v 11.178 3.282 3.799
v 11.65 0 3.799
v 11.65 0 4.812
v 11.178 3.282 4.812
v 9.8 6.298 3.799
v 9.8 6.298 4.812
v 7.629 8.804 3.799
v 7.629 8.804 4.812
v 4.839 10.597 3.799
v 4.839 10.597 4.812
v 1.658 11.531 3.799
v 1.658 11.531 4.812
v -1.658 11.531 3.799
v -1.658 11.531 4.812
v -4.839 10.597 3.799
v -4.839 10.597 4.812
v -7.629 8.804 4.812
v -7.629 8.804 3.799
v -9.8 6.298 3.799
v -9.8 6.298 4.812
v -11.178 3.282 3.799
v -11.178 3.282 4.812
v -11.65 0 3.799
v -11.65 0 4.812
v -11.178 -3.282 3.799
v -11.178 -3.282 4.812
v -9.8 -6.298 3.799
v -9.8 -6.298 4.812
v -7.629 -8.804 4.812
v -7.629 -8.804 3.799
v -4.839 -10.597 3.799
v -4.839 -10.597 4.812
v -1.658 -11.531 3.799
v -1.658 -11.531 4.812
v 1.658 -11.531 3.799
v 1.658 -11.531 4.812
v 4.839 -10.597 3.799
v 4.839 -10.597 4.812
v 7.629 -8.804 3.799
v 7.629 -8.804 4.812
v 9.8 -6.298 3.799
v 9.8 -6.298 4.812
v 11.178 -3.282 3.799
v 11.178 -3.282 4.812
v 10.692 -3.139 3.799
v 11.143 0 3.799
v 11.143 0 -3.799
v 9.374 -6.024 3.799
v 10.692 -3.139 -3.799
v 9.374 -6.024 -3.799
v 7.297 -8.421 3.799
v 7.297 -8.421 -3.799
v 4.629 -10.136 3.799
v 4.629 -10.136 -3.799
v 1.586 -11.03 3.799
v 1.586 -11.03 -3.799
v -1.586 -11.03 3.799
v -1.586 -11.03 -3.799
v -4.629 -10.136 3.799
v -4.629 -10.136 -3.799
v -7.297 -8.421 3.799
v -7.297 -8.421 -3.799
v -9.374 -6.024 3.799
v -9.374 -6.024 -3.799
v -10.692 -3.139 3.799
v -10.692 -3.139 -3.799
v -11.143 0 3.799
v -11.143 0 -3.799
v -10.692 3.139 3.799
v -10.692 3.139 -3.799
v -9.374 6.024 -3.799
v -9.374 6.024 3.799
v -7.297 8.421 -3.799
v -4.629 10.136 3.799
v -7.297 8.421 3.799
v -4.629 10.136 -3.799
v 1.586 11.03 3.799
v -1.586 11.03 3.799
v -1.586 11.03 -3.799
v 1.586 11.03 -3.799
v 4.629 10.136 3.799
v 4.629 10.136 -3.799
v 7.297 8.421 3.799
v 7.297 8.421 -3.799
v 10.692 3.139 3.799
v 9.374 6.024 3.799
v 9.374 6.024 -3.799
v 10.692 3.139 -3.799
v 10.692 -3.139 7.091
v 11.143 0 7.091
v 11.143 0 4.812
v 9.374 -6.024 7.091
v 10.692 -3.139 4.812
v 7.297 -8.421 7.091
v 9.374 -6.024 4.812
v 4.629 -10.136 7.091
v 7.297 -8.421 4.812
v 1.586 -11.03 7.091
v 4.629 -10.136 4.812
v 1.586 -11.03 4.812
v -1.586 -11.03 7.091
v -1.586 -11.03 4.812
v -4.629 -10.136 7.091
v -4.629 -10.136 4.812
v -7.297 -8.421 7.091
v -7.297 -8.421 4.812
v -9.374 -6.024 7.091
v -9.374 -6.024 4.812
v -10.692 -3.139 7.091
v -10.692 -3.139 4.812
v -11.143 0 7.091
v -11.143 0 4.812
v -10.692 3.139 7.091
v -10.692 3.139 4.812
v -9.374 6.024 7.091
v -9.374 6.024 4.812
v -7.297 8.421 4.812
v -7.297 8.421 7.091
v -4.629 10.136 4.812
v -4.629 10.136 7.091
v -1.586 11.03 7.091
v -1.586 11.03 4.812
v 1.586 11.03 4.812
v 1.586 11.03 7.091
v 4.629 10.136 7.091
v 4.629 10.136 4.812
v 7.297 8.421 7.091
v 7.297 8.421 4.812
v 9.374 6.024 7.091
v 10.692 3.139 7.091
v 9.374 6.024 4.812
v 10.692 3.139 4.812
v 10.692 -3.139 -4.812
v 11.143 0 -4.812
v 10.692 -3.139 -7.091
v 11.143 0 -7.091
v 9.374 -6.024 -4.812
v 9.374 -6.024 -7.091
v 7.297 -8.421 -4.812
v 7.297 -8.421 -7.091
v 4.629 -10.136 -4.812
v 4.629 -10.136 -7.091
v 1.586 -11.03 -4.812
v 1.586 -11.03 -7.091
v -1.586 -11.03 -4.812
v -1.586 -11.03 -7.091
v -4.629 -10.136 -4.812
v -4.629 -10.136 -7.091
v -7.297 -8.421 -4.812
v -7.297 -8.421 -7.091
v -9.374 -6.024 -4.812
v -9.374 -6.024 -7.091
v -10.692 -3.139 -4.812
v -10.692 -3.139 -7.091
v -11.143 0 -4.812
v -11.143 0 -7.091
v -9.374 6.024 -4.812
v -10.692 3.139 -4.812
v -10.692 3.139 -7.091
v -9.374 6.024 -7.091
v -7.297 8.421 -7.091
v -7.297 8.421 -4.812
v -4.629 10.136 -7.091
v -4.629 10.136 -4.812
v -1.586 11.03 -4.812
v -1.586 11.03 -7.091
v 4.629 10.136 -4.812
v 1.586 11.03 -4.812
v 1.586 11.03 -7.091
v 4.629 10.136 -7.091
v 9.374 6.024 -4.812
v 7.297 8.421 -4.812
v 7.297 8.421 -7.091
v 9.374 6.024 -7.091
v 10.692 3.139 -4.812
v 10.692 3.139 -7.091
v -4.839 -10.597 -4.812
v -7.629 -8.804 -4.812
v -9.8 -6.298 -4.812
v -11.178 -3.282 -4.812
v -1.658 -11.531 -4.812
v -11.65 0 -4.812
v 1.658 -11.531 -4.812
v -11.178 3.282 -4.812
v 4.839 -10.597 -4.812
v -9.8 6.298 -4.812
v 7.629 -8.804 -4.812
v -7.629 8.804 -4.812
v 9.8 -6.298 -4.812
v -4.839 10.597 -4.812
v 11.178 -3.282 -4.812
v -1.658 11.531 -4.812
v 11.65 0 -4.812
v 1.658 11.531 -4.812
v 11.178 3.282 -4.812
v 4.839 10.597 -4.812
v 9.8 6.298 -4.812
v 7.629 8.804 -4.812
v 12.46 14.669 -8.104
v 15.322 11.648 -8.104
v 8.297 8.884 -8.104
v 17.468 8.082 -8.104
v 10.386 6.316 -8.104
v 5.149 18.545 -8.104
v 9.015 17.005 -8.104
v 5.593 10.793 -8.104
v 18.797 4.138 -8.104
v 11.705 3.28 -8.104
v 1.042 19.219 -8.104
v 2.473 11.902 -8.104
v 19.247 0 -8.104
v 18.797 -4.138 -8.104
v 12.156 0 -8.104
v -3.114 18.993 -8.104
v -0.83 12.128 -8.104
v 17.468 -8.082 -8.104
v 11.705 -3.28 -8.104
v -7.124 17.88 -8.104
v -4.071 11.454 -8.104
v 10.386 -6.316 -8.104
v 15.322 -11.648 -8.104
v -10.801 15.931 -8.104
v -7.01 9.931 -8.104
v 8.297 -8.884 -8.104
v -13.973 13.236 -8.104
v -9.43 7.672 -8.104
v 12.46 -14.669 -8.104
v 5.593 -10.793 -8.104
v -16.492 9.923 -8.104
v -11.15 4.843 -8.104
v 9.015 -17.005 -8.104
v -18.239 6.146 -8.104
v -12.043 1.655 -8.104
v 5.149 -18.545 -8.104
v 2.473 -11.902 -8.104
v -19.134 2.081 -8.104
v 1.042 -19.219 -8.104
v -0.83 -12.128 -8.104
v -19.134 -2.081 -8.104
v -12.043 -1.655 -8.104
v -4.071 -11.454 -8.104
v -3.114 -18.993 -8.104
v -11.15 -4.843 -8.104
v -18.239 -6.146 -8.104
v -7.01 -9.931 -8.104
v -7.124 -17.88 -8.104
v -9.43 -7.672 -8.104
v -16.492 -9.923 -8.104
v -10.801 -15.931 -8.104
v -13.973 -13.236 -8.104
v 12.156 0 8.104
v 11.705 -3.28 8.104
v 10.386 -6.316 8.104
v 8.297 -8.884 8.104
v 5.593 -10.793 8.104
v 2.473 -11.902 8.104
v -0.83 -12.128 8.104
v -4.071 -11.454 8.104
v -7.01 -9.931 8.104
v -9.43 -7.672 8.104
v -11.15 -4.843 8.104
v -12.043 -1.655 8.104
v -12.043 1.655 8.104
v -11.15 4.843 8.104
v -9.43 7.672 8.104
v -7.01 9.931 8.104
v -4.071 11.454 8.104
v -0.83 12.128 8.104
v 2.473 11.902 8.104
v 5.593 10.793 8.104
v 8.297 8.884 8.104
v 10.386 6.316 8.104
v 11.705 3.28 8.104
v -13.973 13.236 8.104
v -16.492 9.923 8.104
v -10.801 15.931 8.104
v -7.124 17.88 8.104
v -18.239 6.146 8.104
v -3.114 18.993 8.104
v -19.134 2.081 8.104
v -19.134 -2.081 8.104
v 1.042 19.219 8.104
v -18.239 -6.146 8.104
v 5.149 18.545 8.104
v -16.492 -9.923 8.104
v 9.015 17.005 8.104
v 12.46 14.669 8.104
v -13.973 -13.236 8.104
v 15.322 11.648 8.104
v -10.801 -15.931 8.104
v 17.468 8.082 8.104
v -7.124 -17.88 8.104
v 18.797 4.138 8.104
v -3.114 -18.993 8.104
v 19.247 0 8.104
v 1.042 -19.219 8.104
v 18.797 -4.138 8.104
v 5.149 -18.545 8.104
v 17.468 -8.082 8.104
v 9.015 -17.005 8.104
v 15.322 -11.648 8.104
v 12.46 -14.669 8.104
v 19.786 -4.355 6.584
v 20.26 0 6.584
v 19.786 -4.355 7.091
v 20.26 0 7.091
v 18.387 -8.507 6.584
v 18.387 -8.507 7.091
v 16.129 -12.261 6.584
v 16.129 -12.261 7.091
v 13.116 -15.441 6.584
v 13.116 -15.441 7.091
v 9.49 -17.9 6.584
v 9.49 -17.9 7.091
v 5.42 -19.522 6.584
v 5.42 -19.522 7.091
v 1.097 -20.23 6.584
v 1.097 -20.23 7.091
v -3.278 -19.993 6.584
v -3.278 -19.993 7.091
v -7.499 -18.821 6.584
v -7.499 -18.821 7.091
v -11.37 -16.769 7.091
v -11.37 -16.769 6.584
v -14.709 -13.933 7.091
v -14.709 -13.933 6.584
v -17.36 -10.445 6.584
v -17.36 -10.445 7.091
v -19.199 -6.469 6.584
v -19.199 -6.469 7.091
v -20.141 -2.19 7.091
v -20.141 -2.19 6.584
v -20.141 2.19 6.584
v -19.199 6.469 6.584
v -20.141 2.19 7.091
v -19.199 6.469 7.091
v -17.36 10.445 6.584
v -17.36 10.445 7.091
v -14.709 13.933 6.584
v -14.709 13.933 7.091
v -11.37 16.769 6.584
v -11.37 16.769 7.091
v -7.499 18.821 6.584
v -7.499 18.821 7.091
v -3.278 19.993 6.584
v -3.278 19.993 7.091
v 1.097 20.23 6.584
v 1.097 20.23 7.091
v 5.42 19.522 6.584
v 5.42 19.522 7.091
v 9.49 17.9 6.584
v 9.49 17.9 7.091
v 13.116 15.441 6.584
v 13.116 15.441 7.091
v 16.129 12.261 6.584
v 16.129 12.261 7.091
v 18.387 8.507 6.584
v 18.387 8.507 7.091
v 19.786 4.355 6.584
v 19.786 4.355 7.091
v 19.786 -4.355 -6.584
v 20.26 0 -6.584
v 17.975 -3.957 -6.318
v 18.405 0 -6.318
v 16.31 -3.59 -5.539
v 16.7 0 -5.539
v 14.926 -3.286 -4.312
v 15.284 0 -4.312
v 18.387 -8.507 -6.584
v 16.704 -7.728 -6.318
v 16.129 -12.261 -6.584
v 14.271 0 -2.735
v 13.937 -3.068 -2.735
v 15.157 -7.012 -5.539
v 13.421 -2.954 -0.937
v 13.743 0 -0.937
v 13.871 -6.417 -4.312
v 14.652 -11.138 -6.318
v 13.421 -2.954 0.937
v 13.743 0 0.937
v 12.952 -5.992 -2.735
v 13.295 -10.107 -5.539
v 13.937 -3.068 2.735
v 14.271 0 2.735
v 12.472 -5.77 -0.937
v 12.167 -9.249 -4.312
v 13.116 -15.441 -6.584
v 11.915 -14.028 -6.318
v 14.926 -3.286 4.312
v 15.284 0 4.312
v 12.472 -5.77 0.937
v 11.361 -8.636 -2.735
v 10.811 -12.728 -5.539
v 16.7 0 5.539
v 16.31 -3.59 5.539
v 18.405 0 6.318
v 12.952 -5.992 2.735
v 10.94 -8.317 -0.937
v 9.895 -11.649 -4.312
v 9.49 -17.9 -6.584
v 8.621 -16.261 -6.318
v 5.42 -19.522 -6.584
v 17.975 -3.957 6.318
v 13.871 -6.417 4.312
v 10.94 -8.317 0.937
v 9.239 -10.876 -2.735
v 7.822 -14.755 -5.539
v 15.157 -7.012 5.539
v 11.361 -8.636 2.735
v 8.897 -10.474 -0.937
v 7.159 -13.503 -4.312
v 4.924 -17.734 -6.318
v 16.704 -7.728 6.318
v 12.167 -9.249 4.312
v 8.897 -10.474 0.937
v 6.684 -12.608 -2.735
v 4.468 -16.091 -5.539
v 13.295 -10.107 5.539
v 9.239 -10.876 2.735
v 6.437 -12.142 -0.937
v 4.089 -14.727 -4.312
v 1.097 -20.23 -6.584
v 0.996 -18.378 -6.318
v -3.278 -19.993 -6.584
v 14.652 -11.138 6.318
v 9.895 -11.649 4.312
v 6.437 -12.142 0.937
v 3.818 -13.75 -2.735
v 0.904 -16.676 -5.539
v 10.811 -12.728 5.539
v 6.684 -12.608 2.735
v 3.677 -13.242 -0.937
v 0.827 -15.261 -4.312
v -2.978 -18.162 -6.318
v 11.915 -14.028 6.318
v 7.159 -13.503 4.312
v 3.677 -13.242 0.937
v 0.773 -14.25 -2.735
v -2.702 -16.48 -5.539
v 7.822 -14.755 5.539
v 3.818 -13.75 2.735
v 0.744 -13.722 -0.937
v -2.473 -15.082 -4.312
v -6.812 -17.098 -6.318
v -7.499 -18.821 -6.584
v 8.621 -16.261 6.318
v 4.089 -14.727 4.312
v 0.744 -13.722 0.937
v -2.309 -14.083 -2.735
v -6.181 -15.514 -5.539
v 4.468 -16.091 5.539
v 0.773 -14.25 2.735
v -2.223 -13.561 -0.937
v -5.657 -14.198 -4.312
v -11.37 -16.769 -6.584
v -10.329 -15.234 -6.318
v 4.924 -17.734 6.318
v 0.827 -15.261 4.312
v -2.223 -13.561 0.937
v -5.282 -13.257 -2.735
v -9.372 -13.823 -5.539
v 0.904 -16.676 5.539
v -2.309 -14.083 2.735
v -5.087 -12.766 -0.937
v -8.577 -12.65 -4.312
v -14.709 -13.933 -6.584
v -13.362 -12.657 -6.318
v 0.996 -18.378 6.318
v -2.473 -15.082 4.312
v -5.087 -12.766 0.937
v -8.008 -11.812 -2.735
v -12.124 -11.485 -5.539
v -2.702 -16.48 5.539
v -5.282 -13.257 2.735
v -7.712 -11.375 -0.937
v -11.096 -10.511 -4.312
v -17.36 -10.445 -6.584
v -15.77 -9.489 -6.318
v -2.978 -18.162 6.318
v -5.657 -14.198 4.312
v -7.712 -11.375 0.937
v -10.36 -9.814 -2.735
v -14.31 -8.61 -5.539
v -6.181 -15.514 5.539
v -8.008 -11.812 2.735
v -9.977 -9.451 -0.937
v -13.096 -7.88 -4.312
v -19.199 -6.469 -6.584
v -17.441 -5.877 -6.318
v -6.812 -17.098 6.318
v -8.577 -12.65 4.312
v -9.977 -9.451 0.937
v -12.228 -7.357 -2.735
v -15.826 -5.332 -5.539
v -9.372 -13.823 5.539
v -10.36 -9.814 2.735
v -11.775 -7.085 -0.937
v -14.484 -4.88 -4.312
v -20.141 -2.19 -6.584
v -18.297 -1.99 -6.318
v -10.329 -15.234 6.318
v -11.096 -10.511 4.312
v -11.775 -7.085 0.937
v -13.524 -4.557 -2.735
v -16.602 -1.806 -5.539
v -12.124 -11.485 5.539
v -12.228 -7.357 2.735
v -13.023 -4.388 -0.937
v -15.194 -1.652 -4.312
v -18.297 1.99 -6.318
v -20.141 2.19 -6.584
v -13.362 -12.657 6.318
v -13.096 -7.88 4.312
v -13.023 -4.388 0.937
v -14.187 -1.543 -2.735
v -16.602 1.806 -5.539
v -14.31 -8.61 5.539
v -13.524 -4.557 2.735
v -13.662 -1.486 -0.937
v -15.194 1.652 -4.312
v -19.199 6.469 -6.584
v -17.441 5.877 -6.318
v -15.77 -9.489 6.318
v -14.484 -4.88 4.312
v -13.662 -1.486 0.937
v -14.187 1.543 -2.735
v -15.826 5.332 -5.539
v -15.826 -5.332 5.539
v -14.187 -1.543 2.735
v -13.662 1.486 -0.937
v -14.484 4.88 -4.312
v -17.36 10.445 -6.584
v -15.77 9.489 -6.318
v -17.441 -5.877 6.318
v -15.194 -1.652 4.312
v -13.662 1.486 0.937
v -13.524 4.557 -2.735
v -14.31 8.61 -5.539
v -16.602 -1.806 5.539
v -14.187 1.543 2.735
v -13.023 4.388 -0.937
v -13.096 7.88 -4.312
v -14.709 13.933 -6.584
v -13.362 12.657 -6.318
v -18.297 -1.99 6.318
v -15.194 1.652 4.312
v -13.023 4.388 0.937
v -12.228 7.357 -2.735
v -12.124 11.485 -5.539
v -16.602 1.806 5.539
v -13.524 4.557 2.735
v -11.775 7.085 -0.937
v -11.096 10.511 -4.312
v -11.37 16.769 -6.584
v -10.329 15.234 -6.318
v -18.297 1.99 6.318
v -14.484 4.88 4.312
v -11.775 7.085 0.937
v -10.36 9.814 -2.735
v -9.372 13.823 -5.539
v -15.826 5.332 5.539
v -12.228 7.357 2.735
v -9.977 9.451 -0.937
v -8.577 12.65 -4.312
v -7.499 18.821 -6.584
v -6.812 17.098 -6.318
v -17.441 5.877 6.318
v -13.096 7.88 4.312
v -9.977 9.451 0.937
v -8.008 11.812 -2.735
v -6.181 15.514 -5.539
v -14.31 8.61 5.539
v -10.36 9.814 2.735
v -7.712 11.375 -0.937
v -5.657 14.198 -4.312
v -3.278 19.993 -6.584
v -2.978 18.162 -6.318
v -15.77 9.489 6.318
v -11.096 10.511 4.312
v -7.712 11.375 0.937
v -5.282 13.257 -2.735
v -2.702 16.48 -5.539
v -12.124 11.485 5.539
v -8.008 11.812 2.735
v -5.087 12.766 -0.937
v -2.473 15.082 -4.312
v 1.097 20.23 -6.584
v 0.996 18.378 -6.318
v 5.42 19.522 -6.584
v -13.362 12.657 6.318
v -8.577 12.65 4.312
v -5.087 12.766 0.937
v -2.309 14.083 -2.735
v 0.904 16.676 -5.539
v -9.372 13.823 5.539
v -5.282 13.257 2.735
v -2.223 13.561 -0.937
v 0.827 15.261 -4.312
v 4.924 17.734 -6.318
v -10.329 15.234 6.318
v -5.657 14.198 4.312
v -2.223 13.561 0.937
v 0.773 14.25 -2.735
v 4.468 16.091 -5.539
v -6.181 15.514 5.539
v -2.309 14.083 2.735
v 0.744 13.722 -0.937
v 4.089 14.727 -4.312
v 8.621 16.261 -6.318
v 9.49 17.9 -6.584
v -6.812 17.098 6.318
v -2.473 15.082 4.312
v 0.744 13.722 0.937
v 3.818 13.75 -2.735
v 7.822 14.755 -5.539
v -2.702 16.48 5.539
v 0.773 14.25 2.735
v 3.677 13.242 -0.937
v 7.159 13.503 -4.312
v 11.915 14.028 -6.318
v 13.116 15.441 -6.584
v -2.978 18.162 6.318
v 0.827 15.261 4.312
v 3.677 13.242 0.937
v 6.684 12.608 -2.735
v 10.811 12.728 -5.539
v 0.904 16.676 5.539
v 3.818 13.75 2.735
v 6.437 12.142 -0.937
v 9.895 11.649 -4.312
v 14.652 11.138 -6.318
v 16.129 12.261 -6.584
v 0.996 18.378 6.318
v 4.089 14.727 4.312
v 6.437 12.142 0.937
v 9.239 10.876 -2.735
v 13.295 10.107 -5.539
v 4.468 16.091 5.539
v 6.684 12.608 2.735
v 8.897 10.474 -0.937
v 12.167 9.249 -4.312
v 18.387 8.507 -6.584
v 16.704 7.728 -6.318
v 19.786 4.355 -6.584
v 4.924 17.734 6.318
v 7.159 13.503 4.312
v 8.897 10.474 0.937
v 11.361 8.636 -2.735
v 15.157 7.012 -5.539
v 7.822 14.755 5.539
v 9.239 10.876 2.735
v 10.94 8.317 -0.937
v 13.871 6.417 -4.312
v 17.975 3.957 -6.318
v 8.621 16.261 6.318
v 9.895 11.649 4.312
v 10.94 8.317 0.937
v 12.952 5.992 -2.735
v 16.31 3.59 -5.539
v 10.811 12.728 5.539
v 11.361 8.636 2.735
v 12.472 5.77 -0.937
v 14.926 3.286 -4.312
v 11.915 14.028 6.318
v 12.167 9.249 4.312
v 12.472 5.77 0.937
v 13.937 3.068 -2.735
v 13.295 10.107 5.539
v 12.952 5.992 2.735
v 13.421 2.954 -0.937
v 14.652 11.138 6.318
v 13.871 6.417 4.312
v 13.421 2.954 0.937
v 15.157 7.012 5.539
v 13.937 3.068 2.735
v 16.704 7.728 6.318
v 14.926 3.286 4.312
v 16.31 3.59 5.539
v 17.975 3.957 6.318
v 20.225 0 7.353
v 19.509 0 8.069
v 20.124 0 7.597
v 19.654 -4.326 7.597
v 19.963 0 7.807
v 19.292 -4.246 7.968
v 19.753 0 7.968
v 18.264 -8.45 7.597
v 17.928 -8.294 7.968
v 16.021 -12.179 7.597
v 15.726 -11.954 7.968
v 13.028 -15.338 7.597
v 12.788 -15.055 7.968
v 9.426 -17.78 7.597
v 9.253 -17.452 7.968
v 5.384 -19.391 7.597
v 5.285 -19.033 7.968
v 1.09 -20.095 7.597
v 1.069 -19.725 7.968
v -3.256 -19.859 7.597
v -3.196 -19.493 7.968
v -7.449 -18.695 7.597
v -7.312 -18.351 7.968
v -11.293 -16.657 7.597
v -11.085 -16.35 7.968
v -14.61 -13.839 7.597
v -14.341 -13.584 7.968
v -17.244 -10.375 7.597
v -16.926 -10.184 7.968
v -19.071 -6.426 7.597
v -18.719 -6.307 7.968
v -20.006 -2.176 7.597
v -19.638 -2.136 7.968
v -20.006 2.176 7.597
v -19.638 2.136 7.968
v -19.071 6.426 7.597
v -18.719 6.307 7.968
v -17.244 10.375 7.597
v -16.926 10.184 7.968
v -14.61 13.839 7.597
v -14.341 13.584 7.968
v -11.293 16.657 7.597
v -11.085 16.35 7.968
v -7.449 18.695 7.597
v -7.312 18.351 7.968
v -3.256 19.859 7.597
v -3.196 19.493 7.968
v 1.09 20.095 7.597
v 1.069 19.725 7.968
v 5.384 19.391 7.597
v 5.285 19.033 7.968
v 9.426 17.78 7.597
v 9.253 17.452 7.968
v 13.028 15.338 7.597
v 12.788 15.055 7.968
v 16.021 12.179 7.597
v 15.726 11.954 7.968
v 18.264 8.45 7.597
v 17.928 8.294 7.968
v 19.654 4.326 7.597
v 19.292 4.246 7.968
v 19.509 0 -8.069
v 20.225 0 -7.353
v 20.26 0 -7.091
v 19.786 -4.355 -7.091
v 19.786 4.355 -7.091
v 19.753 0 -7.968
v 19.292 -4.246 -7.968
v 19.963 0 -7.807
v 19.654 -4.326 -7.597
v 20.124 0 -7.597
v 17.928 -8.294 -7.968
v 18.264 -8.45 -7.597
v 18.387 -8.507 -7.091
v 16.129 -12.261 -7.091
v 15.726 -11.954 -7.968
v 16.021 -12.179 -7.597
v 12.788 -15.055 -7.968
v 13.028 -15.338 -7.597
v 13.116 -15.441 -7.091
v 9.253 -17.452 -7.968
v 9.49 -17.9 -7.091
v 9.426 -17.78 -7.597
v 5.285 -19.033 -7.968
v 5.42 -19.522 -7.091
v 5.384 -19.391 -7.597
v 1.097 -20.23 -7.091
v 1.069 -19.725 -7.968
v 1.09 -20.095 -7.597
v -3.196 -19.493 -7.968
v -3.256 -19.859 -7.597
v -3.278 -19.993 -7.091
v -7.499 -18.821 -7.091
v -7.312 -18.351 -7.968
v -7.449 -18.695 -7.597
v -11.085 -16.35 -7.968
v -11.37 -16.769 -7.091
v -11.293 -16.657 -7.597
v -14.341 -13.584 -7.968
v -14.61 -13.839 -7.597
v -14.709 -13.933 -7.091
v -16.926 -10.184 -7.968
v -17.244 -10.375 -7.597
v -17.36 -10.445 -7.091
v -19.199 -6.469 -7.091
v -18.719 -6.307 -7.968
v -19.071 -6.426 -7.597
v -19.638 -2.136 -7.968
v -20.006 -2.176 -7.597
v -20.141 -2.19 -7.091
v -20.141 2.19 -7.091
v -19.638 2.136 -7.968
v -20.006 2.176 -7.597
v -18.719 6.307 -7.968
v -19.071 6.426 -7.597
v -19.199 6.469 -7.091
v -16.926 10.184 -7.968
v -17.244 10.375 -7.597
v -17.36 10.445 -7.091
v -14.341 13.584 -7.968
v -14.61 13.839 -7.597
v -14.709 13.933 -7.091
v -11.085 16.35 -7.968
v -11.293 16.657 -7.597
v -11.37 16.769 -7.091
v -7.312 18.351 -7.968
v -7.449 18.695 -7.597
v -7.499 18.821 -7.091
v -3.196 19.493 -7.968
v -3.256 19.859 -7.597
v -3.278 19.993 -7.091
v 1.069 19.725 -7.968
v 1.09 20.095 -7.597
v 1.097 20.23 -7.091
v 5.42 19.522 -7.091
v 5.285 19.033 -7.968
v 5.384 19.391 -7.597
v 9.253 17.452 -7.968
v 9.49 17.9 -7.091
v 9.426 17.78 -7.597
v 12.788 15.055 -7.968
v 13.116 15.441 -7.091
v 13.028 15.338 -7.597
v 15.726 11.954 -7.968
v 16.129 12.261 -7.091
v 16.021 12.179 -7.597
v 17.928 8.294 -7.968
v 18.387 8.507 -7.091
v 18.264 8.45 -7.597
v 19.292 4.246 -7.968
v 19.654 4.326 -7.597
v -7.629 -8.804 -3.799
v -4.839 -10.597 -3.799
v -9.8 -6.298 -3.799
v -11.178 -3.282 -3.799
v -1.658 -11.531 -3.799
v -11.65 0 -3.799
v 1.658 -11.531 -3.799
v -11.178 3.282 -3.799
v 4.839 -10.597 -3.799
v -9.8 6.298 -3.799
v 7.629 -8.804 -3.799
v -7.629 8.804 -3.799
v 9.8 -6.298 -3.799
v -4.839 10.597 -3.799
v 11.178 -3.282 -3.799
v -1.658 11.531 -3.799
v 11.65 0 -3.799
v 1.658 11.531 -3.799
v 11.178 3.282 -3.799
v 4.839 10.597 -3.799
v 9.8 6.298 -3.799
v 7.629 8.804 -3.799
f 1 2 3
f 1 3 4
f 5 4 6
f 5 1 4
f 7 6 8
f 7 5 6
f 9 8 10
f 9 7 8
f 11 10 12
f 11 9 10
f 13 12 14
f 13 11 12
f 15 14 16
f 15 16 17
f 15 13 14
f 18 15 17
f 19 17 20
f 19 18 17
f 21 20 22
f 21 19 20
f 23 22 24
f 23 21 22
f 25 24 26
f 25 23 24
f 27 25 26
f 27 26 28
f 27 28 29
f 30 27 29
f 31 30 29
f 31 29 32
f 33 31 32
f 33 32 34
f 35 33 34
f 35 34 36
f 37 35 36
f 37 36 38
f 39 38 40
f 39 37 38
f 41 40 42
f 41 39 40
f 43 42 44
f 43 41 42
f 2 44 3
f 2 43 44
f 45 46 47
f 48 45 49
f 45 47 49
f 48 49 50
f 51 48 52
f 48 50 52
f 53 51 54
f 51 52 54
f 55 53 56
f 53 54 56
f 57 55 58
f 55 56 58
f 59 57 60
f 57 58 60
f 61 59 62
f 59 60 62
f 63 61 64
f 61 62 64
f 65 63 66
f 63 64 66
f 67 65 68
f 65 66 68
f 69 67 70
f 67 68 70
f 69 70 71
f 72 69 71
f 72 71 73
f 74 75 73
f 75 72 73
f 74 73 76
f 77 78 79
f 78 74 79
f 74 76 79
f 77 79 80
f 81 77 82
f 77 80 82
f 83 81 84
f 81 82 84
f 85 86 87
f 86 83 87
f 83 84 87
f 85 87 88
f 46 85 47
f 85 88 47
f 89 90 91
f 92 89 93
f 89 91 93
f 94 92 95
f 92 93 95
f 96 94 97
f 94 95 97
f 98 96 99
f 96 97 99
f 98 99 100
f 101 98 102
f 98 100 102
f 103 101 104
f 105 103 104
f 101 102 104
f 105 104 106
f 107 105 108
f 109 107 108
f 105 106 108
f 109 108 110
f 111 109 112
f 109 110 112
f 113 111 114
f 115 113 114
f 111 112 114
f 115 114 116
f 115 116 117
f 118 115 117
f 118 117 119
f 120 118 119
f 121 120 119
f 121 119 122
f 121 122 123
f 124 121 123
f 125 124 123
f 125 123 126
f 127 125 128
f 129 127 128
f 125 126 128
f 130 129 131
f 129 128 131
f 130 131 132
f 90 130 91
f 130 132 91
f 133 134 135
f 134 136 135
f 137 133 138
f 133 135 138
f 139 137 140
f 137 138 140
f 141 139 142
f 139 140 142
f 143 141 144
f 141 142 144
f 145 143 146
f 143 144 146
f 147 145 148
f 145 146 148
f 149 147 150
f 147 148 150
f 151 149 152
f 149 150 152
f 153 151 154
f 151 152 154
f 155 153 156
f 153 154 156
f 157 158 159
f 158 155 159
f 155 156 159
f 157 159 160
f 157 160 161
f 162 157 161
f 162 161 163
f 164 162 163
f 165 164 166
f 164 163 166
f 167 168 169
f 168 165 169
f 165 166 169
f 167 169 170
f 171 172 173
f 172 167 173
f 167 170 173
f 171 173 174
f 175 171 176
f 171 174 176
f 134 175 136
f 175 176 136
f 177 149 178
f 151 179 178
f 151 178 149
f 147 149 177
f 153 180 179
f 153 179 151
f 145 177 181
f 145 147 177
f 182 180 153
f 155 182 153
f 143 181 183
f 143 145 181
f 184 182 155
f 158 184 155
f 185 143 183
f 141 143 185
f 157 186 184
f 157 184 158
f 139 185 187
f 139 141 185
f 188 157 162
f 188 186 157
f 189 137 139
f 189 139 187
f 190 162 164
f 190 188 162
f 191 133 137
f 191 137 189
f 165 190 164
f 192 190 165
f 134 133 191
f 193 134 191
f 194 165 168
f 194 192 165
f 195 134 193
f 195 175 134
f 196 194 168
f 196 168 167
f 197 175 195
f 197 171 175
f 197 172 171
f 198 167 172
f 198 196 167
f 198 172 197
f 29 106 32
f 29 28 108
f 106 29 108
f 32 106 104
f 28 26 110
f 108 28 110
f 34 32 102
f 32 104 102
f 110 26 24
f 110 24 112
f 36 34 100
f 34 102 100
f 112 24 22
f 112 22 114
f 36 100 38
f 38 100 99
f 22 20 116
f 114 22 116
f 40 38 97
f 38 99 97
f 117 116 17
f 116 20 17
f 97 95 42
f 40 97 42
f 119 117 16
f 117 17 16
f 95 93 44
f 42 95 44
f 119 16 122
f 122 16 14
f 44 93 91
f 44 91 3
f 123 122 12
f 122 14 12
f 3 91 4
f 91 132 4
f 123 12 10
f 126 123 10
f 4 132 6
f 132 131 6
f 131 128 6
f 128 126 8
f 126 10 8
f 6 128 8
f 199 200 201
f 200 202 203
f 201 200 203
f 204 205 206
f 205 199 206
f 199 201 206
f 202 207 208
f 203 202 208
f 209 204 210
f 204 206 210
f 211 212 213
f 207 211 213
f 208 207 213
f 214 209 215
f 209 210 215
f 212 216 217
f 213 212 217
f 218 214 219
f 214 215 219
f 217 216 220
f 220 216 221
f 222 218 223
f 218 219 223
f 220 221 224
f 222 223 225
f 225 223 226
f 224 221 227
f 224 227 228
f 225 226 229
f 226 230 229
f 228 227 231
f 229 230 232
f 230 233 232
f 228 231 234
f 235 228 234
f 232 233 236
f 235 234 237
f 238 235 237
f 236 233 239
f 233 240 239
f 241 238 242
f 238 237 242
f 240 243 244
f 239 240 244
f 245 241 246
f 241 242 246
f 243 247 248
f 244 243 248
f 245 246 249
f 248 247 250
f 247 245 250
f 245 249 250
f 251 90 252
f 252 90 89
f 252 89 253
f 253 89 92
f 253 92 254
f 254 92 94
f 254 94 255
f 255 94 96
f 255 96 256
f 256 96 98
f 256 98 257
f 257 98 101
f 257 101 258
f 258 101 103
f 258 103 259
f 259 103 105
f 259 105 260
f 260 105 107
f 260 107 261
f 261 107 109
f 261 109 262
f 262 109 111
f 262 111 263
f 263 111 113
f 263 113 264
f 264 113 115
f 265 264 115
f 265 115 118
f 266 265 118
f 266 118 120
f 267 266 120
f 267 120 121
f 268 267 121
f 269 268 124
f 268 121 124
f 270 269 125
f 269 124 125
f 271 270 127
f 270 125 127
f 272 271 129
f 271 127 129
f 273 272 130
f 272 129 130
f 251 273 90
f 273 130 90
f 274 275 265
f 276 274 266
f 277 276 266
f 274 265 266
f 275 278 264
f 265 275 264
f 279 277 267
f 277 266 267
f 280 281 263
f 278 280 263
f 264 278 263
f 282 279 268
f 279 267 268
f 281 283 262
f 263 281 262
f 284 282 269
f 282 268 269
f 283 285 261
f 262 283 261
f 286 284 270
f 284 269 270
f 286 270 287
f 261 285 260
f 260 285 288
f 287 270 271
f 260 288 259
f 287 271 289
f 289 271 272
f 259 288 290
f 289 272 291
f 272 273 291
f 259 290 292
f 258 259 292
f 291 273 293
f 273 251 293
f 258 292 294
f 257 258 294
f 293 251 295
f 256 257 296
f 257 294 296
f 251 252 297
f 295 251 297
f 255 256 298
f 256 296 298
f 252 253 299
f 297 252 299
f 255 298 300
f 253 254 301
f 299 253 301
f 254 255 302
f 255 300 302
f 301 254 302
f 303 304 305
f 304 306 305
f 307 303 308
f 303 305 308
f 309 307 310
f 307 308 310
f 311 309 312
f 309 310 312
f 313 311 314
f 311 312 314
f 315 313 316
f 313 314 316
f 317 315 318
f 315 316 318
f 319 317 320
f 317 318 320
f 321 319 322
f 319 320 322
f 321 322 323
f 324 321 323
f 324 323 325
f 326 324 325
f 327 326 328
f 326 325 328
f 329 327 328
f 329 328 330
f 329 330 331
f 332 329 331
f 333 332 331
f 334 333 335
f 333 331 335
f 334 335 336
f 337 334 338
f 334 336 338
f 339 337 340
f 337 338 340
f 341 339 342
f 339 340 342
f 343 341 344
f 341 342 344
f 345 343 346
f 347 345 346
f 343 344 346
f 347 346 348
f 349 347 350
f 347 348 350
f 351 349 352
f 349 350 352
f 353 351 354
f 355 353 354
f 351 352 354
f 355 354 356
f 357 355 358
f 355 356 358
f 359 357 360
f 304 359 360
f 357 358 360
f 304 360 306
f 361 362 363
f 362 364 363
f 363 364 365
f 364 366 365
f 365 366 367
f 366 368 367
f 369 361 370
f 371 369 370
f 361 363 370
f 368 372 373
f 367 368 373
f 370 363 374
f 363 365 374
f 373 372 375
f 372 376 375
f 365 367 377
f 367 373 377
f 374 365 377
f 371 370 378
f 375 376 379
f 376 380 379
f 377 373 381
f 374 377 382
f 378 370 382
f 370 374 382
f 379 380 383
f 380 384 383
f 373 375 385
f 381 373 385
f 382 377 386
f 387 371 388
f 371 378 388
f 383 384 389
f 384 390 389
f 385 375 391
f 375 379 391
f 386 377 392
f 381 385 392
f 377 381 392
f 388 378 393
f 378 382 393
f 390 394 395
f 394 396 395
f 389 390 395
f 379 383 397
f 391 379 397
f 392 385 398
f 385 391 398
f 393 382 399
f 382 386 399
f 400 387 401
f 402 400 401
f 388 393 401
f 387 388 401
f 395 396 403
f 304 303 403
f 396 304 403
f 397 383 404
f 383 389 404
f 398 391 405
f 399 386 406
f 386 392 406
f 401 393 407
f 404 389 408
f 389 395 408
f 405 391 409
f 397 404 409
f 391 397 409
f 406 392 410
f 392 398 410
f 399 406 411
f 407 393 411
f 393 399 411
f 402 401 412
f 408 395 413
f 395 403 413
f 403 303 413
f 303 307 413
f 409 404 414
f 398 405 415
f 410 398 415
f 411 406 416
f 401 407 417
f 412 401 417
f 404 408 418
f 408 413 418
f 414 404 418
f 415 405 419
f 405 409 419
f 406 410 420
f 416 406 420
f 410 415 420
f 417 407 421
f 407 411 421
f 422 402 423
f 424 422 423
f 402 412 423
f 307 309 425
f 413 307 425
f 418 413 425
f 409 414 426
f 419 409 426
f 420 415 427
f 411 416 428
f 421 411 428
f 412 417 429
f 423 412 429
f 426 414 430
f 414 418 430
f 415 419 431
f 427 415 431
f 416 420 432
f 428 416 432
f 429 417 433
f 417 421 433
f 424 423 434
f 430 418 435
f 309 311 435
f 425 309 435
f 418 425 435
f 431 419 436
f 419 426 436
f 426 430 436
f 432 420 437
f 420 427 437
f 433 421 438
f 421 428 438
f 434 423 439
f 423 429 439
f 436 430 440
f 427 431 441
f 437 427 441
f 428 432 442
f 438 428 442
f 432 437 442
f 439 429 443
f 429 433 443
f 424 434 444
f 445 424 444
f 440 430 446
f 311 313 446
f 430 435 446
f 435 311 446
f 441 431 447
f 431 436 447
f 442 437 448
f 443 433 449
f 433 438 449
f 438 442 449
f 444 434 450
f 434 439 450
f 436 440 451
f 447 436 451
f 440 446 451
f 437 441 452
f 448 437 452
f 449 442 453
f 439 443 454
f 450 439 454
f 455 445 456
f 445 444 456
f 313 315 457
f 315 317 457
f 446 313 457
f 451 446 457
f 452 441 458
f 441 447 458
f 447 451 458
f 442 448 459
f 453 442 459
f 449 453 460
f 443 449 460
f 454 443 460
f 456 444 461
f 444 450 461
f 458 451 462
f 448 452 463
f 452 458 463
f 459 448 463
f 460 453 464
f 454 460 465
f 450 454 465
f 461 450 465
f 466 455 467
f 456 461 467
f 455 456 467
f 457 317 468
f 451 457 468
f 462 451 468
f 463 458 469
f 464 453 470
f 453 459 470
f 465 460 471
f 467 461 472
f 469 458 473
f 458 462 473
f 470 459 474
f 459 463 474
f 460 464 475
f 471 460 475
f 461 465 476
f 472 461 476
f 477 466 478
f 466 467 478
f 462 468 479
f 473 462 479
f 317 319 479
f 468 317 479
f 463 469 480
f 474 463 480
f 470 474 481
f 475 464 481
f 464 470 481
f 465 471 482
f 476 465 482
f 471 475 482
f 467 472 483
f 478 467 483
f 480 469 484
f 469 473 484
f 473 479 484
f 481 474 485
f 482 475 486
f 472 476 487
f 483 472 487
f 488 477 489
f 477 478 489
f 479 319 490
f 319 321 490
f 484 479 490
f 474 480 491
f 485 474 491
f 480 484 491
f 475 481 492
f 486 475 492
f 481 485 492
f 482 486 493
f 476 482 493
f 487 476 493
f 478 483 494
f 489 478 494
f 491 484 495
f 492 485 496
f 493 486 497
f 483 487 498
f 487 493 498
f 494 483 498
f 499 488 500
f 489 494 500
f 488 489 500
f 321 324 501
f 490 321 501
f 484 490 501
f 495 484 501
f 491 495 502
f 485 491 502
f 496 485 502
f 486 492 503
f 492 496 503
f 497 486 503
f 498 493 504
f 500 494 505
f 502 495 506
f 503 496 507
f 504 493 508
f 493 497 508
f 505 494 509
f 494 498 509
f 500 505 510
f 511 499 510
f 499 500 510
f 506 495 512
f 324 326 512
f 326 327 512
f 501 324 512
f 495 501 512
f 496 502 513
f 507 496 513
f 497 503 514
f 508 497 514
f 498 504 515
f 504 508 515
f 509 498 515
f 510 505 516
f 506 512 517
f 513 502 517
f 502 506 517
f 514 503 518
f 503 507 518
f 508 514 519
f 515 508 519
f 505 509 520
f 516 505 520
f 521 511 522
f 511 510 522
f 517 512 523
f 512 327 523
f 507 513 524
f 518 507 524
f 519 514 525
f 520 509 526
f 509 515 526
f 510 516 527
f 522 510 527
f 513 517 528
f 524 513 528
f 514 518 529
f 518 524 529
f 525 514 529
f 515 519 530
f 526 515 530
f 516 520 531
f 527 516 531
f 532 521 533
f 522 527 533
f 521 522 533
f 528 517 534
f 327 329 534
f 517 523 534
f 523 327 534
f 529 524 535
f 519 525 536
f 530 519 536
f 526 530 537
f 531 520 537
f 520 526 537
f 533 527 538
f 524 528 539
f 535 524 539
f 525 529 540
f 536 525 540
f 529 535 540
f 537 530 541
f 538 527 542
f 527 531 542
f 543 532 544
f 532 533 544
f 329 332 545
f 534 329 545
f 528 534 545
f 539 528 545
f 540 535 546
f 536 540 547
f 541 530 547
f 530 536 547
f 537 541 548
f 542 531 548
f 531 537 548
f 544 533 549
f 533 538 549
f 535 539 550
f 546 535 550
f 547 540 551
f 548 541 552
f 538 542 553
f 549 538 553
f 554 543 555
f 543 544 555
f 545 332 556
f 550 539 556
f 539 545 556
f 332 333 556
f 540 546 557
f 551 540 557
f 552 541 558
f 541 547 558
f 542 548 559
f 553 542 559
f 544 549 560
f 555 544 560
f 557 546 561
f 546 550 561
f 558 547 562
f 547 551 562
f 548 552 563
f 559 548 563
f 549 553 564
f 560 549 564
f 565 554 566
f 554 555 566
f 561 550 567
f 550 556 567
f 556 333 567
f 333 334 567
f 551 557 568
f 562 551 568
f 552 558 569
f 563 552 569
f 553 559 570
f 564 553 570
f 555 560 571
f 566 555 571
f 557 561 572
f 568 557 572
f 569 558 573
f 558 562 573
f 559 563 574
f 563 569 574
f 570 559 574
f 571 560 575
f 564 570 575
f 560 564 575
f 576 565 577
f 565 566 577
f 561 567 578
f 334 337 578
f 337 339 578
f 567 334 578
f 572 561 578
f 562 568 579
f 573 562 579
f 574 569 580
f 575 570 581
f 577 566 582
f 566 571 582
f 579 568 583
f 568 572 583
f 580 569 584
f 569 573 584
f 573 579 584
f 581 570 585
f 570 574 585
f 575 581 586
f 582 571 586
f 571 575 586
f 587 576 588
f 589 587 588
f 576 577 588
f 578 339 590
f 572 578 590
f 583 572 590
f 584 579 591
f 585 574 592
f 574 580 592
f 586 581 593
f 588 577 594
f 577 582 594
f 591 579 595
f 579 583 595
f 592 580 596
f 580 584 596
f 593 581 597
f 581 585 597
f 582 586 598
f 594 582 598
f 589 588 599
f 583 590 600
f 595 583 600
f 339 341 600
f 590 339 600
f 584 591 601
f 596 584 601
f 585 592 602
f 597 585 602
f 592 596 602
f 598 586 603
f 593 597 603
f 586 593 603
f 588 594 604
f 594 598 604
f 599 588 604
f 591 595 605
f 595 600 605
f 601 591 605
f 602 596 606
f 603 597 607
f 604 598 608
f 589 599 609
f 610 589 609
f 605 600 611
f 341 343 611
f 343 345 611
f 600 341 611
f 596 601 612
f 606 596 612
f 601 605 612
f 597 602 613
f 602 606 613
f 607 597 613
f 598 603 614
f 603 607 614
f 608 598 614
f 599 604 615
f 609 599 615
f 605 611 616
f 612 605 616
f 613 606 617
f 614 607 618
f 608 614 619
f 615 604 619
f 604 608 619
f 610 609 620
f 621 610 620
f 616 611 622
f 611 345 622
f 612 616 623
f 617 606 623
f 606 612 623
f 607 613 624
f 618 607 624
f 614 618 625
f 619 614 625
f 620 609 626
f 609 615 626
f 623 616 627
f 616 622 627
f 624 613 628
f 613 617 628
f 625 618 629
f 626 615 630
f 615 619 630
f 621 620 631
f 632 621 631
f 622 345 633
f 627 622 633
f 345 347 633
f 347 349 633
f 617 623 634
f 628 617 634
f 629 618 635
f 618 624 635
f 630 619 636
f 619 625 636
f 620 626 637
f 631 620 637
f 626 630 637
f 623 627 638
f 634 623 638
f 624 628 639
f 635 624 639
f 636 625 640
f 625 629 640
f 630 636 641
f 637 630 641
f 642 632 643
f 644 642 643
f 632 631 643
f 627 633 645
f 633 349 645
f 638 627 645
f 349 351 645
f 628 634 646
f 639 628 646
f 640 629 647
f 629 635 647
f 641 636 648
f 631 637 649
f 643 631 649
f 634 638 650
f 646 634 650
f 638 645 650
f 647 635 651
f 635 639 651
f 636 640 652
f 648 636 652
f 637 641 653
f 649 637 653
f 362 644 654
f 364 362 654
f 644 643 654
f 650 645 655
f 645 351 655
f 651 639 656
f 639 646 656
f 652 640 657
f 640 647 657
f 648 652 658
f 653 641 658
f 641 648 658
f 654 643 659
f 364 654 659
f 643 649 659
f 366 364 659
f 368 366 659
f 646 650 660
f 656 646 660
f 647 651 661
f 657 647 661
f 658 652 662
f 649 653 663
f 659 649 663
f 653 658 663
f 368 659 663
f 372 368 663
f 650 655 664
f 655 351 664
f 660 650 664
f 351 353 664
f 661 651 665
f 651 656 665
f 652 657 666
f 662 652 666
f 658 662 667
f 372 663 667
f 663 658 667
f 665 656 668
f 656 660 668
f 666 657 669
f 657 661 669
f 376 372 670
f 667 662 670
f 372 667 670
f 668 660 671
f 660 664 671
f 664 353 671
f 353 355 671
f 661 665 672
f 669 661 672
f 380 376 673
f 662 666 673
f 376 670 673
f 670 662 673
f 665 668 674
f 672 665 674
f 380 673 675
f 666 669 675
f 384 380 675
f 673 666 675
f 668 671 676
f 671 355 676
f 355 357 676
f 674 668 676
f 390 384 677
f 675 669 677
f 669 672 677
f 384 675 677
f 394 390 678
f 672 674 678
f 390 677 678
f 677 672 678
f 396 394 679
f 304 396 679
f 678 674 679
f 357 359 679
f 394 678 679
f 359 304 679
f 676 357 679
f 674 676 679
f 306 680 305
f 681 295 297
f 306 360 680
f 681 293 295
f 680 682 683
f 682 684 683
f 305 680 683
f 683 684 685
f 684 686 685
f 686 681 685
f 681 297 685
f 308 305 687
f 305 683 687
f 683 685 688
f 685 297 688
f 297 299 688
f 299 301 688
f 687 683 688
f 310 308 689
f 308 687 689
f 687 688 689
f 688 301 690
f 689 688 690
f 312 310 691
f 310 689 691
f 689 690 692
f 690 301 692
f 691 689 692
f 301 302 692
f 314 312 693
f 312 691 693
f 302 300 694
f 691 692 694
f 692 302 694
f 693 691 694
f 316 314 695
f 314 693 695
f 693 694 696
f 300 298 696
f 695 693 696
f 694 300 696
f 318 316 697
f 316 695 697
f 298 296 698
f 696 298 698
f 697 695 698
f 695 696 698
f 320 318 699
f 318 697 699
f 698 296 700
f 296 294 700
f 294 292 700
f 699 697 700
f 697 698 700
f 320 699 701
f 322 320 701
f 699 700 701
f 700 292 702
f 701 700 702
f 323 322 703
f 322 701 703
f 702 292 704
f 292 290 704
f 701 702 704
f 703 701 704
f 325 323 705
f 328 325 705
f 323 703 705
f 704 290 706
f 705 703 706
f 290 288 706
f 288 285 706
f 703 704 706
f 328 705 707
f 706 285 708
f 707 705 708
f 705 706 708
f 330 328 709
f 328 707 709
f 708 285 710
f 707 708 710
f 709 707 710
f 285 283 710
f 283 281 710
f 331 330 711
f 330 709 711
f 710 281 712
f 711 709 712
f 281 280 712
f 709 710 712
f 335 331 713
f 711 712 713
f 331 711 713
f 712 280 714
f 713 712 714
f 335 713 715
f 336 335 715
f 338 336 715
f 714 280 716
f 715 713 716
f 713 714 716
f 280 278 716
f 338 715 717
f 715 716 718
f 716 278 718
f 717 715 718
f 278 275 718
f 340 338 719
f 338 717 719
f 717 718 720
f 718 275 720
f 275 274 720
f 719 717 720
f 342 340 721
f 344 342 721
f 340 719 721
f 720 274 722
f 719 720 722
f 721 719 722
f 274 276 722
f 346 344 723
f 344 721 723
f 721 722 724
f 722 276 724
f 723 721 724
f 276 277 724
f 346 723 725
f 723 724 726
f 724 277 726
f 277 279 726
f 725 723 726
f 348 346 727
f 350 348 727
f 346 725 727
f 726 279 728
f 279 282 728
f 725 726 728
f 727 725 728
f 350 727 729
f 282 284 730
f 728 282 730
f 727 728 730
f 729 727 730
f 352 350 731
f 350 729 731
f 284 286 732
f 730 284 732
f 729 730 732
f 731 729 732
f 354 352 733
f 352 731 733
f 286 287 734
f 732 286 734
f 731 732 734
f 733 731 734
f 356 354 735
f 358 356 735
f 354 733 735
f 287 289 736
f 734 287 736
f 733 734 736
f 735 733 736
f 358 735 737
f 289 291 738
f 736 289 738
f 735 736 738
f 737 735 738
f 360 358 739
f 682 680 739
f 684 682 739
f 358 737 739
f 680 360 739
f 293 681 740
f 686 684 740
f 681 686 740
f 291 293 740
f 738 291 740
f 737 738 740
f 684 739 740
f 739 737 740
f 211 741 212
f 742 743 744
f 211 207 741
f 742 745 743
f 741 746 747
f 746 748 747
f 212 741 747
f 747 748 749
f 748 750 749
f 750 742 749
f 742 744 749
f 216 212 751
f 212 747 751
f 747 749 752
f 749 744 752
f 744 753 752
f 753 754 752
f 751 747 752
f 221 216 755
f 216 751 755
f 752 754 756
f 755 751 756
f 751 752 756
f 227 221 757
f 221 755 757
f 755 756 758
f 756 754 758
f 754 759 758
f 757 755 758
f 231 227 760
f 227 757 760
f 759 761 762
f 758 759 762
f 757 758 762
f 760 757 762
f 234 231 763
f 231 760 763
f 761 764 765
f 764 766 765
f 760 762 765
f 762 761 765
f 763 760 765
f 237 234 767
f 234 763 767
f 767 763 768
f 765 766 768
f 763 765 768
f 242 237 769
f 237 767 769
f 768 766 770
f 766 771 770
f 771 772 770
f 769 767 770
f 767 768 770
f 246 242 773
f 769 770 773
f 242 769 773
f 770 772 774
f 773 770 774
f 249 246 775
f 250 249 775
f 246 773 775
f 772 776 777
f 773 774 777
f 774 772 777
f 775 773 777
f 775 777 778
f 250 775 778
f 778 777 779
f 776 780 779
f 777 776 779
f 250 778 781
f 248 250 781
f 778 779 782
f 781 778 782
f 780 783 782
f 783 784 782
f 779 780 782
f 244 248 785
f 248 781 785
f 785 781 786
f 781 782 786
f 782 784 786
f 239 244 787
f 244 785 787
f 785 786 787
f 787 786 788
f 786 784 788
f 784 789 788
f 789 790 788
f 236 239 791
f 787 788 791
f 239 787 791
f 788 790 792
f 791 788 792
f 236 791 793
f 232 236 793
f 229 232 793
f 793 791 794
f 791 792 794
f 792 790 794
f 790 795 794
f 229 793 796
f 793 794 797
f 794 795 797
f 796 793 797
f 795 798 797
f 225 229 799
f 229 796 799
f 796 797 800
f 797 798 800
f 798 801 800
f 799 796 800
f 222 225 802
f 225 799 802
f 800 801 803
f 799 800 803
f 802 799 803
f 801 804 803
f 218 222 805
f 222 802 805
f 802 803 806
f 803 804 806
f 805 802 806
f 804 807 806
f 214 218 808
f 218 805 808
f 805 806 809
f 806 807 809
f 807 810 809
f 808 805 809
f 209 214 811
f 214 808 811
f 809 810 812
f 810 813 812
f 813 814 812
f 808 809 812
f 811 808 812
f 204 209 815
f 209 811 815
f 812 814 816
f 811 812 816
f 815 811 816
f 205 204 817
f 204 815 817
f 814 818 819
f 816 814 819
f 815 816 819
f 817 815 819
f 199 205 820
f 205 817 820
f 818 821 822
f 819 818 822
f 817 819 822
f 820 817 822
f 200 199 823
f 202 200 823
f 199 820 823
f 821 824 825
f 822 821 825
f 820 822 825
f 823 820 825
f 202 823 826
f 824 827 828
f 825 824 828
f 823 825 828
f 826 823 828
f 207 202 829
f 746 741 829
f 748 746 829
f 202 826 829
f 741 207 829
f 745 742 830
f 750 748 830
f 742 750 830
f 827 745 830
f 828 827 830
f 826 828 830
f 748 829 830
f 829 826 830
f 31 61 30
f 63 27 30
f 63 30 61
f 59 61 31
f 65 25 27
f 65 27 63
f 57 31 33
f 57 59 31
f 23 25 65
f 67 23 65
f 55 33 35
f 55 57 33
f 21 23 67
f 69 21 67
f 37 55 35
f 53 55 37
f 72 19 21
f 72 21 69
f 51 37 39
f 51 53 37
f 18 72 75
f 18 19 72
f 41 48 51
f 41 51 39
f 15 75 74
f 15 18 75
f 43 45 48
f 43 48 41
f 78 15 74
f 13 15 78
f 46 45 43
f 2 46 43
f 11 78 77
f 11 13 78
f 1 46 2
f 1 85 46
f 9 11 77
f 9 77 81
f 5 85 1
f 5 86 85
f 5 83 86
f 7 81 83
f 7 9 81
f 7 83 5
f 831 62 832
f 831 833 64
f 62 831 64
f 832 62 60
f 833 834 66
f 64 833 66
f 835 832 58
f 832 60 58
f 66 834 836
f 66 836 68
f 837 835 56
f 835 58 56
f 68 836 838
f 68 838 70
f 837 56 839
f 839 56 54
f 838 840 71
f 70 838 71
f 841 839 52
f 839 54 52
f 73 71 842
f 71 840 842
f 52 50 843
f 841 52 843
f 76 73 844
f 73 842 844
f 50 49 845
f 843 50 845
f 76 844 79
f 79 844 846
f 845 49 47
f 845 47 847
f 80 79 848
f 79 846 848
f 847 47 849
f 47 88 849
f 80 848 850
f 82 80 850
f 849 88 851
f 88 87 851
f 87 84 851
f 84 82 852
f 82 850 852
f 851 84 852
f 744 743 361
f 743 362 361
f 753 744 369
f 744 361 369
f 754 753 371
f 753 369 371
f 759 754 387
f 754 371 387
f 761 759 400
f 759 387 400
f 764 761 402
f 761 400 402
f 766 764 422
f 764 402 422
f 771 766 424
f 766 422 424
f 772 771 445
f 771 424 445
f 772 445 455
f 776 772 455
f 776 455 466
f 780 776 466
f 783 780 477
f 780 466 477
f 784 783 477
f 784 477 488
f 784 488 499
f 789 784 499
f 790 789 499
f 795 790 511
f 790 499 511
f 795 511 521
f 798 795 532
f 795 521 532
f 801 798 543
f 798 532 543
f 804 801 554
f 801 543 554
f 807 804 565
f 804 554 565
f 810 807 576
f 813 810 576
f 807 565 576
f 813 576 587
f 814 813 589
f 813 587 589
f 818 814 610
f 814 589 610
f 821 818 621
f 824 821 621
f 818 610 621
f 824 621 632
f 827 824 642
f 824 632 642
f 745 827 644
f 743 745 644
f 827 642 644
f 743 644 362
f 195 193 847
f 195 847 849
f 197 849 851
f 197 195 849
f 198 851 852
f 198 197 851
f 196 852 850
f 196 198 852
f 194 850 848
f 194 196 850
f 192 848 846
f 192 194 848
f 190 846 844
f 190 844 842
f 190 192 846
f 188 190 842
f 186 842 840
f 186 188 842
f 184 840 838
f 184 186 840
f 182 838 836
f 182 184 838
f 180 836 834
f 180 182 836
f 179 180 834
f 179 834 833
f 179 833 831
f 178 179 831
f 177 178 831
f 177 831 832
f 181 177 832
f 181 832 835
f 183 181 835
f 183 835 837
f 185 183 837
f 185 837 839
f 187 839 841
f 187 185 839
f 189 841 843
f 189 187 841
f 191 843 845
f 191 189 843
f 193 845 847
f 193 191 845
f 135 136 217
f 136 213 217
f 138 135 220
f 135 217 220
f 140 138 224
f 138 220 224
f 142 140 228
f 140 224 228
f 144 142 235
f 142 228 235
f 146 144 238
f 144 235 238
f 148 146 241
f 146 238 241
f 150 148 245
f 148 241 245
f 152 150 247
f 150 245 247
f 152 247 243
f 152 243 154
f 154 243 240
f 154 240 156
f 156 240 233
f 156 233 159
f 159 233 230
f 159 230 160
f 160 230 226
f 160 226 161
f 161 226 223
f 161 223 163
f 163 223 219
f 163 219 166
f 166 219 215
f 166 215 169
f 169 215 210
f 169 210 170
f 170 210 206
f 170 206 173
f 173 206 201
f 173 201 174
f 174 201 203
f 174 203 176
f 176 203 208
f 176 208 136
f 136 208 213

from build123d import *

# Parameters (mm, degrees)
CUT_EXTRUDE1_START = -4.25
SKETCH2_R          = 11.5
SKETCH2_R_2        = 11
CUT_EXTRUDE1_DEPTH = 1
CUT_EXTRUDE2_START = -12.75
SKETCH2_2_R        = 11.5
SKETCH2_2_R_2      = 11
CUT_EXTRUDE2_DEPTH = 1
SCALE1_SCALE       = 1.013


with BuildPart() as part:
    # Sketch1 → Revolve1 (revolve)
    with BuildSketch(Plane(origin=(0, 0, 0), x_dir=(0, 0, -1), z_dir=(1, 0, 0))):
        with BuildLine():
            Line((-7, 11), (7, 11))
            Line((7, 11), (8, 12))
            Line((8, 12), (8, 19))
            ThreePointArc((8, 19), (7.707106781, 19.707106781), (7, 20))
            Line((7, 20), (6.5, 20))
            ThreePointArc((6.5, 20), (0, 13.5), (-6.5, 20))
            Line((-6.5, 20), (-7, 20))
            ThreePointArc((-7, 20), (-7.707106781, 19.707106781), (-8, 19))
            Line((-8, 19), (-8, 12))
            Line((-8, 12), (-7, 11))
        make_face()
    revolve(axis=Axis((0, 0, 0), (0, 0, -1)))

    # Sketch2 → Cut-Extrude1 (cut)
    with BuildSketch(Plane.XY.offset(8).offset(CUT_EXTRUDE1_START)):
        Circle(SKETCH2_R)
        Circle(SKETCH2_R_2, mode=Mode.SUBTRACT)
    extrude(amount=CUT_EXTRUDE1_DEPTH, mode=Mode.SUBTRACT)

    # Sketch2<2> → Cut-Extrude2 (cut)
    with BuildSketch(Plane.XY.offset(8).offset(CUT_EXTRUDE2_START)):
        Circle(SKETCH2_2_R)
        Circle(SKETCH2_2_R_2, mode=Mode.SUBTRACT)
    extrude(amount=CUT_EXTRUDE2_DEPTH, mode=Mode.SUBTRACT)


with BuildPart() as part_1:
    # Scale1: scaled about (0, 0, 0)
    add(part.part.scale(SCALE1_SCALE))


solid = part_1.part
